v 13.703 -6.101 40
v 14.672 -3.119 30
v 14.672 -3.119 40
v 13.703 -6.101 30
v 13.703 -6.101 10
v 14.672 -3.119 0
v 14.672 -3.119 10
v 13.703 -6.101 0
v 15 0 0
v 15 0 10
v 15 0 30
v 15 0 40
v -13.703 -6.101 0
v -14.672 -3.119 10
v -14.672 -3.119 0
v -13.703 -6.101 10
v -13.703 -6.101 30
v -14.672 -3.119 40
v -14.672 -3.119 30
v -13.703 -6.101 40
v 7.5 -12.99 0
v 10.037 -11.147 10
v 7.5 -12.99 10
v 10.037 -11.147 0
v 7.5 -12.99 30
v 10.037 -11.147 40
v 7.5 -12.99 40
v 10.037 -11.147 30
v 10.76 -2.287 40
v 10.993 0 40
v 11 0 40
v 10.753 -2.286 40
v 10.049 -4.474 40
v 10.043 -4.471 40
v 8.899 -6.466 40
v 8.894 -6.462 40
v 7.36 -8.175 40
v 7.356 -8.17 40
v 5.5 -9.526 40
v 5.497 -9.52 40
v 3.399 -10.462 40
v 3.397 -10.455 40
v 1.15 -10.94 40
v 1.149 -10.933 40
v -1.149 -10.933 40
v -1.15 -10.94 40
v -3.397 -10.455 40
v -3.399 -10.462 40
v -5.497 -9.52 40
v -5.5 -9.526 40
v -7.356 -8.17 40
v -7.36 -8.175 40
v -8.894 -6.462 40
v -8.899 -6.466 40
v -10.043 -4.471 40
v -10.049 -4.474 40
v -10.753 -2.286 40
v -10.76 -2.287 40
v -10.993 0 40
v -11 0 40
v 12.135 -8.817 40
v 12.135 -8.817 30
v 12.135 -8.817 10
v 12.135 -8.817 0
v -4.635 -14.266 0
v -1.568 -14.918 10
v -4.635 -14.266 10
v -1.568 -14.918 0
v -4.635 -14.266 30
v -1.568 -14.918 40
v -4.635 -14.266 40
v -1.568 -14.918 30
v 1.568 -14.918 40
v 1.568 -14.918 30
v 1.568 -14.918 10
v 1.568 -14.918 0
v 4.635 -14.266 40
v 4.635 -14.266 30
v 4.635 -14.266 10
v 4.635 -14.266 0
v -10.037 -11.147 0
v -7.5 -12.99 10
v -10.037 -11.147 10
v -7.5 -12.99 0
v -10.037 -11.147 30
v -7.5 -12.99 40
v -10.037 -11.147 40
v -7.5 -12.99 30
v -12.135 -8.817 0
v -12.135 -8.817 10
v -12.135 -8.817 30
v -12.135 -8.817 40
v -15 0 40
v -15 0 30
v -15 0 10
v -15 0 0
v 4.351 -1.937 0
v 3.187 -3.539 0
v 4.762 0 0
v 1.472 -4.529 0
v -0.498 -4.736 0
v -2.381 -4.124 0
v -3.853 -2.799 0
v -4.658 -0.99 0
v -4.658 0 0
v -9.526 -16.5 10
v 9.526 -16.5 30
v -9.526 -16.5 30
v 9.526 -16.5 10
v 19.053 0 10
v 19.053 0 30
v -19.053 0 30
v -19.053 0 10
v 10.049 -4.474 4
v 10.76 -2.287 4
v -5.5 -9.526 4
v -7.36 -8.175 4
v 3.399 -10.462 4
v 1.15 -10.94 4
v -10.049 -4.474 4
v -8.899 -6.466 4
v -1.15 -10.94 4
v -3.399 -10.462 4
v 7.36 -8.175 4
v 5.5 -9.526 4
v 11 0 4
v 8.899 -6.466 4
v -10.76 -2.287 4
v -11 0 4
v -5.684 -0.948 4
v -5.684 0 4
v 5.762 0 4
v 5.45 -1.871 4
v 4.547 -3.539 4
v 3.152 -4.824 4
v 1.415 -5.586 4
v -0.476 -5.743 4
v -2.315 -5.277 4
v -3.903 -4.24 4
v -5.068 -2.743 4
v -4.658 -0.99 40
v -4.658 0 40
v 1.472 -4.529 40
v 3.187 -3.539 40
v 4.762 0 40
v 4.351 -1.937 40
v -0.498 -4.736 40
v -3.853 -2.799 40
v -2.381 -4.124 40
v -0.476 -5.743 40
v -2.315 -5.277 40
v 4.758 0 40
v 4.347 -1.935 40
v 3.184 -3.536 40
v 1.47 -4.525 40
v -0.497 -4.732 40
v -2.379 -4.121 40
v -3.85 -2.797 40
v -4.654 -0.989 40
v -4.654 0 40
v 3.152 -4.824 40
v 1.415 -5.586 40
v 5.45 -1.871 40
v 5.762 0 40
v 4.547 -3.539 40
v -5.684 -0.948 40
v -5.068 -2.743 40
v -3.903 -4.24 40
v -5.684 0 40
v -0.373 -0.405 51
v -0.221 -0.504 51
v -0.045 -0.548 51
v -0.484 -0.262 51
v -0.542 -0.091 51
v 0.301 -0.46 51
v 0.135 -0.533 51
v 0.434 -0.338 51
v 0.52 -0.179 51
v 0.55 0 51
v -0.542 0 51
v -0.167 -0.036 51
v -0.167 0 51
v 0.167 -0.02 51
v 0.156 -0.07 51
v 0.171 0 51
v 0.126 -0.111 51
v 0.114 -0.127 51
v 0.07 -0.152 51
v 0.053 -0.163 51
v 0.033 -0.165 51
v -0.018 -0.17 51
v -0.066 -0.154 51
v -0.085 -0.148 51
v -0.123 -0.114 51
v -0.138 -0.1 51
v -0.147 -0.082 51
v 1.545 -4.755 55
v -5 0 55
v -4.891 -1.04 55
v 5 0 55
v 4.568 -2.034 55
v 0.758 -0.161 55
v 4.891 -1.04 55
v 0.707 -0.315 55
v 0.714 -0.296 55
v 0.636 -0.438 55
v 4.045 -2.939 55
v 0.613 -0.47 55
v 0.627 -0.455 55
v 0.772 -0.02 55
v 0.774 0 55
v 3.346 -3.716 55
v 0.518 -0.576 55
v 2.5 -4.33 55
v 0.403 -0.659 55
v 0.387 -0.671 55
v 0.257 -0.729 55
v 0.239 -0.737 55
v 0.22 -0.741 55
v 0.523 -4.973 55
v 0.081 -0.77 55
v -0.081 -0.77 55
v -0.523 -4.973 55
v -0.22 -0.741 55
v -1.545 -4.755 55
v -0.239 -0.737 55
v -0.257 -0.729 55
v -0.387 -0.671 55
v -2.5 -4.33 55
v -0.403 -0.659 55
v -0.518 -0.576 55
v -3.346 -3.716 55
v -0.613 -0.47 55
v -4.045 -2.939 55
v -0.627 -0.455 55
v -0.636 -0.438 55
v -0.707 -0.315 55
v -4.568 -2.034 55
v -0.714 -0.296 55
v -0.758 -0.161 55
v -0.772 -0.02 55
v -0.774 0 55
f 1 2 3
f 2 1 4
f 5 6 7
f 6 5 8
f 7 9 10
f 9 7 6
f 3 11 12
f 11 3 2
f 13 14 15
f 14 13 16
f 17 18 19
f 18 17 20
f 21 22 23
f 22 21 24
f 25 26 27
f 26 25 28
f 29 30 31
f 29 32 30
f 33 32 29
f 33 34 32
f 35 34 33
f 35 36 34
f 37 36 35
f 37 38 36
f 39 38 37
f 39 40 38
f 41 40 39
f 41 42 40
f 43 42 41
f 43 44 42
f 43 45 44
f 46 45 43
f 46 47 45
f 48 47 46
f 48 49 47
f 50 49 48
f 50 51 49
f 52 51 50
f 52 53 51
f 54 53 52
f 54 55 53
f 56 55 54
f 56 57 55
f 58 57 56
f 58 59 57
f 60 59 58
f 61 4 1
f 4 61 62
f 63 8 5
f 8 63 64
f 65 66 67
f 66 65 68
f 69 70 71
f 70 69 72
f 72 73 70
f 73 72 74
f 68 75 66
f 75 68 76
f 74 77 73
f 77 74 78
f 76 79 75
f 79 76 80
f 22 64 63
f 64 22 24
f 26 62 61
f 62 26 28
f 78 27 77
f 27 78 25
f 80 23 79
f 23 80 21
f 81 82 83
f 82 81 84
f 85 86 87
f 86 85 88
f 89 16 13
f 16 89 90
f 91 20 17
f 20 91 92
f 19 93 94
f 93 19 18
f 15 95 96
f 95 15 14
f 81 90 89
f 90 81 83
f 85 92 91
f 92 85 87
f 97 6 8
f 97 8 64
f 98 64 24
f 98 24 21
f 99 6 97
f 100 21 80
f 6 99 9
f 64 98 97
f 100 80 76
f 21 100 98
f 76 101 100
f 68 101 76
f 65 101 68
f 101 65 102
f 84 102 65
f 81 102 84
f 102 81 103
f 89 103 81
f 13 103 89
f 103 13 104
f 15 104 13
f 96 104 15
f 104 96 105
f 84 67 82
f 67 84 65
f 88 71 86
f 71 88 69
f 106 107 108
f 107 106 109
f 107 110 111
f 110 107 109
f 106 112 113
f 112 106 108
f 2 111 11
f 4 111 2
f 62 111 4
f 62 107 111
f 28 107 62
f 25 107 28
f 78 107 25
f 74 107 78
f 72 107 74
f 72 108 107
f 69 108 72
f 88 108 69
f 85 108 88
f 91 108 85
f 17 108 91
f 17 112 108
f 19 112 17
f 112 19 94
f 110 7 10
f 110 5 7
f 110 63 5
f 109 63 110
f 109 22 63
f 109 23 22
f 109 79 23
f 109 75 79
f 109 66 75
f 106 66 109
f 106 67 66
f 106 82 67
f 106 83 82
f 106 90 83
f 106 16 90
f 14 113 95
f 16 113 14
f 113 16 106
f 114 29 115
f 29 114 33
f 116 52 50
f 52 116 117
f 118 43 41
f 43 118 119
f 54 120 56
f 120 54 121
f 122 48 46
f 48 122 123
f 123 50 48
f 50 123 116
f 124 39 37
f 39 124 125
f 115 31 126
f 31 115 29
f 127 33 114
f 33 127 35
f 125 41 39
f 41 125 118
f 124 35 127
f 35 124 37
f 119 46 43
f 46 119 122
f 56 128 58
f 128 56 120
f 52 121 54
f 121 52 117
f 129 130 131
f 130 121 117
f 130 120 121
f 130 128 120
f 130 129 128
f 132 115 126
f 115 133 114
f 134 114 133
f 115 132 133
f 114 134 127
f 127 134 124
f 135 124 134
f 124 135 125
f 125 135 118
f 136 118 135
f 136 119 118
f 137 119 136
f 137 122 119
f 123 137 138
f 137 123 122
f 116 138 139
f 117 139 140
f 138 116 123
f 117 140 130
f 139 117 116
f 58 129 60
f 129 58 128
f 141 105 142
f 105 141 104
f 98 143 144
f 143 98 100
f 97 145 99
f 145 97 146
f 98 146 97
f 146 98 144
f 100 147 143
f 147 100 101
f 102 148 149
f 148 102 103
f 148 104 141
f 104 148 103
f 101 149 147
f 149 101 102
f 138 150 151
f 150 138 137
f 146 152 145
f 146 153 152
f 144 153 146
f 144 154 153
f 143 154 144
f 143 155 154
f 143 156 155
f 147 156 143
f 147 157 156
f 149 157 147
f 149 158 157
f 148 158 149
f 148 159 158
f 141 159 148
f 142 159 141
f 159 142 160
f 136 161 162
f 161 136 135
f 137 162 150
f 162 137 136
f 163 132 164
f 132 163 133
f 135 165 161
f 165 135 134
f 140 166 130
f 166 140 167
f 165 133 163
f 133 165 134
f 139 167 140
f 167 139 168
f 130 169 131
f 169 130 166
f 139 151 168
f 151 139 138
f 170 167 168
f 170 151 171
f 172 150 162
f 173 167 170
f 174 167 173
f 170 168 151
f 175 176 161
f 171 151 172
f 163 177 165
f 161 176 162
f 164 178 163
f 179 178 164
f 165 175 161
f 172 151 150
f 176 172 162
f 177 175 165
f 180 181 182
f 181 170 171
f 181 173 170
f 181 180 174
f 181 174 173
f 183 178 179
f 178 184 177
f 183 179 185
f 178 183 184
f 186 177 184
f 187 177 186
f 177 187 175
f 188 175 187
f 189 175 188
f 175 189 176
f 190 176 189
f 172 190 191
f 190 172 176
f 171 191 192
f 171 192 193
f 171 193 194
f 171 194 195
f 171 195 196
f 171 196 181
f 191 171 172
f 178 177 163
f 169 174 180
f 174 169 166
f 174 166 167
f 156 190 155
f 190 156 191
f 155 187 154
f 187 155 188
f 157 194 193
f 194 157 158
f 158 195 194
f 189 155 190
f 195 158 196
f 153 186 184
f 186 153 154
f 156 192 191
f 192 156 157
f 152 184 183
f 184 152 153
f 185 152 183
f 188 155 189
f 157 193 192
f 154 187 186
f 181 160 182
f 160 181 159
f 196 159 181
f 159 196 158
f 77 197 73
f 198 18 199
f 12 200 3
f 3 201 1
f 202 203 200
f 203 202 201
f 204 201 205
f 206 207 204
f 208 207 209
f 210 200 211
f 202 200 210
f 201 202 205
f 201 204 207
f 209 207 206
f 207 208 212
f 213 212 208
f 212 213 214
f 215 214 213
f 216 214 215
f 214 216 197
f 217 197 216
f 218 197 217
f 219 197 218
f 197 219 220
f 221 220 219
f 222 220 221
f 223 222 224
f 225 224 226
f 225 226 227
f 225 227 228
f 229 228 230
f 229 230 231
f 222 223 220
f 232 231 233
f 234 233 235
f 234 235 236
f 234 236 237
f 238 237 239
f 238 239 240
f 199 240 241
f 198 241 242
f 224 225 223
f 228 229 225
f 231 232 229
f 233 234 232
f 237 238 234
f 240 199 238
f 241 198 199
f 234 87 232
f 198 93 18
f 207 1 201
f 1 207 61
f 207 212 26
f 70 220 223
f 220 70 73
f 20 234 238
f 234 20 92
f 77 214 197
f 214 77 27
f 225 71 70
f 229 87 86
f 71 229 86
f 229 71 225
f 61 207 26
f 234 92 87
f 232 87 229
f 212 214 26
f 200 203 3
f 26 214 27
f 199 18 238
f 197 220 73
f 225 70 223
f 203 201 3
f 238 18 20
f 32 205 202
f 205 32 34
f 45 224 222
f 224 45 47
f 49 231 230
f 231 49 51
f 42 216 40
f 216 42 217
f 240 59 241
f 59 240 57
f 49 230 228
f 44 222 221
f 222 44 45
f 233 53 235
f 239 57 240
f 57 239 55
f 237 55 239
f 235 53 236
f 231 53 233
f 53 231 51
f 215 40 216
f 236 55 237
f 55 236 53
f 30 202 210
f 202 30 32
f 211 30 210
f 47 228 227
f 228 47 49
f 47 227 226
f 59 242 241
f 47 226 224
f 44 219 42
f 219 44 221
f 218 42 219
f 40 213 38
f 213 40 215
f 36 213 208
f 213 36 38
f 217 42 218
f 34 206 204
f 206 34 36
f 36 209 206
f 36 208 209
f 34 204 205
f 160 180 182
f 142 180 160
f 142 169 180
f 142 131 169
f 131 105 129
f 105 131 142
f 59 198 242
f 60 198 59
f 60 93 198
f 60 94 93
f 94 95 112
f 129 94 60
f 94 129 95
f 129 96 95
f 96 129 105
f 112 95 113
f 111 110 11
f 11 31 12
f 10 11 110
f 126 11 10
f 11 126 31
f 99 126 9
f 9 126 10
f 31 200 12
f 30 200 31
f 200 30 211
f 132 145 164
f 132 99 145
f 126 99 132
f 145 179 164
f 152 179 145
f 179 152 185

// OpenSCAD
// file: lib/polygon.scad
//============================================================
// OpenSCAD
// Regular Convex Polygon Library
//============================================================
/*

	Definition

	N = Number of Side N >=3
	A = apothem
		radius of inside circle
	R = circumradius
		Radius of outside circle
	S = Side
		Lenght of a side

	Build polygon with the Apothem :
	N and A is known
	Need to calculate S then R
	use $fn

	Build Polygon with Circumradius
	N and R known
	use $fn

	Build Polygon with Side
	N and S Known
	Need to calculate R and optionaly A
	use $fn	

	TO DO
	ASSIGN Correction - not mandatory


	For more information :
	http://en.wikipedia.org/wiki/Regular_polygon

*/

//------------------------------------------------------------
// Polygon : 
//------------------------------------------------------------
module Polygon(N=3,A=0,R=0,S=0,h=0,debug=false)
{
	N = ( N < 3 ? 3 : N );

	angle = 360/N;
	angleA = angle/2;

	if (debug)
	{
		echo("N = ", N);
		echo("A = ", A);
		echo("S = ", S);
		echo("R = ", R);
	}

	if ( A > 0 )		// if A assign R and S
	{
			assign
			(
				S = 2 * A * tan(angleA),							// assign
				//R = (S/2) / sin(angleA)						// no assign ???
				R = ( A * tan(angleA) ) / sin(angleA)		// asign
			)
			{
				_Build_Polygon(N=N,R=R,h=h);
				if (debug)
				{
					echo("aN = ", N);
					echo("aA = ", A);
					echo("aS = ", S);
					echo("aR = ", R);
					#cylinder(r=A,h=h+1,center=true,$fn=150);
					%cylinder(r=R,h=h+1,center=true,$fn=150);
				}
			}
	}
	else
	{
		if ( S > 0 )		// if S assign R and A
		{
			assign
			(
				R = (S/2) / sin(angleA),			// assign
				A = S / ( 2 * tan(angleA) )		// assign
			)
			{
				_Build_Polygon(N=N,R=R,h=h);
				if (debug)
				{
					echo("sN = ", N);
					echo("sA = ", A);
					echo("sS = ", S);
					echo("sR = ", R);
					#cylinder(r=A,h=h+1,center=true,$fn=150);
					%cylinder(r=R,h=h+1,center=true,$fn=150);
				}
			}
		}
		else
		{
			if ( R == 0 )		// default
			{
				assign
				(
					S = 2 * R * sin(angleA),			// no assign ???
					A = S / ( 2 * tan(angleA) )		// no assign ???
				)
				_Build_Polygon(N=N,h=h);
				if (debug)
				{
					echo("0N = ", N);
					echo("0A = ", A);
					echo("0S = ", S);
					echo("0R = ", R);
					#cylinder(r=A,h=h+1,center=true,$fn=150);
					%cylinder(r=R,h=h+1,center=true,$fn=150);
				}
			}
			else		// build with R
			{

// assign ???
				assign
				(
					S = 2 * R * sin(angleA),
					A = S / ( 2 * tan(angleA) )						// no assign ???
					//A = R * ( sin(angleA) / tan(angleA) )	// no assign ???
				)
				_Build_Polygon(N=N,R=R,h=h);
				if (debug)
				{
					echo("rN = ", N);
					echo("rA = ", A);
					echo("rS = ", S);
					echo("rR = ", R);
					%cylinder(r=R,h=h+1,center=true,$fn=150);
				}




			}
		}
	}

	if (debug)
	{
		echo("fN = ", N);
		echo("fA = ", A);
		echo("fS = ", S);
		echo("fR = ", R);
	}
}

//------------------------------------------------------------
// Build
//------------------------------------------------------------
module _Build_Polygon(N=3,R=1,h=0)
{
	if (h > 0)
	{
		// 3D primitive h>0
		cylinder(r=R,h=h,$fn=N,center=true);
	}
	else
	{
		// 2D primitive h=0
		circle(r=R,$fn=N,center=true);
	}
}

//------------------------------------------------------------
// Building lots from N=3, N=N+1
// http://en.wikipedia.org/wiki/Polygon
//------------------------------------------------------------

module Trigon(A=0,R=0,S=0,h=0,debug=false)
	{Polygon(N=3,A=A,R=R,S=S,h=h,debug=debug);}

module Triangle(A=0,R=0,S=0,h=0,debug=false)
	{Polygon(N=3,A=A,R=R,S=S,h=h,debug=debug);}

module Tetragon(A=0,R=0,S=0,h=0,debug=false)
	{Polygon(N=4,A=A,R=R,S=S,h=h,debug=debug);}

module Quadrilateral(A=0,R=0,S=0,h=0,debug=false)
	{Polygon(N=4,A=A,R=R,S=S,h=h,debug=debug);}

module Quadrangle(A=0,R=0,S=0,h=0,debug=false)
	{Polygon(N=4,A=A,R=R,S=S,h=h,debug=debug);}

module Pentagon(A=0,R=0,S=0,h=0,debug=false)
	{Polygon(N=5,A=A,R=R,S=S,h=h,debug=debug);}

module Hexagon(A=0,R=0,S=0,h=0,debug=false)
	{Polygon(N=6,A=A,R=R,S=S,h=h,debug=debug);}

module Heptagon(A=0,R=0,S=0,h=0,debug=false)
	{Polygon(N=7,A=A,R=R,S=S,h=h,debug=debug);}

module Octagon(A=0,R=0,S=0,h=0,debug=false)
	{Polygon(N=8,A=A,R=R,S=S,h=h,debug=debug);}

module Enneagon(A=0,R=0,S=0,h=0,debug=false)
	{Polygon(N=9,A=A,R=R,S=S,h=h,debug=debug);}

module Nonagon(A=0,R=0,S=0,h=0,debug=false)
	{Polygon(N=9,A=A,R=R,S=S,h=h,debug=debug);}

module Decagon(A=0,R=0,S=0,h=0,debug=false)
	{Polygon(N=10,A=A,R=R,S=S,h=h,debug=debug);}

module Handecagon(A=0,R=0,S=0,h=0,debug=false)
	{Polygon(N=11,A=A,R=R,S=S,h=h,debug=debug);}

module Dodecagon(A=0,R=0,S=0,h=0,debug=false)
	{Polygon(N=12,A=A,R=R,S=S,h=h,debug=debug);}

// ...

module Hectogon(A=0,R=0,S=0,h=0,debug=false)
	{Polygon(N=100,A=A,R=R,S=S,h=h,debug=debug);}

//==EOF=======================================================
// file: constants.scad
intake_material_thickness=2;
intake_port1_diameter=120;
intake_port1_length=100;

intake_port2_diameter=80;
intake_port2_length=100;

fan_diameter_inner = 125;
fan_diameter_outer = 250;
fan_base_thickness = 15;
fan_blades = 36;
fan_blade_thickness = 4;
fan_height = 50;

intake_box_size = 300;




plenum_show_section=1;
plenum_diameter=400;
plenum_height=1000;
plenum_taper=600;
plenum_taper_to=100;

plenum_wall_thickness = 2;

plenum_port1_diameter = 80;
plenum_port1_length = 100;

plenum_port2_diameter = plenum_diameter / 3;
plenum_port2_inner_length = 300;
plenum_port2_outer_length = 300;

plenum_entry_height = plenum_height - 200;
plenum_entry_width = plenum_port1_diameter + 10;
// main file
include <constants.scad>
include <lib/polygon.scad>

section=1;

nozzle_nut_size=20;
nozzle_nut_height=10;
//Hexagon(nozzle_nut_size,h=nozzle_nut_height);

nozzle_dia = 30;
nozzle_height = 40;
nozzle_port_dia = 4;

nozzle_water_port_dia = 3/8 * 25.4;
nozzle_water_pinhole_dia=0.1;
nozzle_air_pinhole_dia=0.2;

nozzle_wall_thickness = 4;
nozzle_inner_wall_thickness = 2;

nozzle_tip_height = 15;

module nozzle() {
	
	module nozzle_outer_body() {
		cylinder(
			h=nozzle_height,
			d=nozzle_dia
		);
		translate([
			0,0,nozzle_height/2
		]) Hexagon(nozzle_dia*0.55, h=nozzle_height/2);
	}

	module nozzle_body_hole(){
		translate([0,0,nozzle_wall_thickness]) cylinder(
			h=nozzle_height+1,
			d=nozzle_dia-nozzle_wall_thickness*2
		);
		translate([0,0,-1])
			cylinder(
				h=nozzle_wall_thickness+2,
				d=nozzle_water_port_dia
			);
	}

	module nozzle_water_body() {
		difference() {
		union() {
			cylinder(
				h=nozzle_height,
				d=nozzle_water_port_dia + nozzle_inner_wall_thickness
			);
		}
		translate([0,0,-1])
			cylinder(
				h=nozzle_height+2,
				d=nozzle_water_port_dia
			);
		}
	}

	module nozzle_water_cap() {
		translate([0,0,nozzle_height])
		difference() {
			cylinder(
				h=nozzle_tip_height-4,
				d1=nozzle_water_port_dia + nozzle_inner_wall_thickness,
				d2=nozzle_water_pinhole_dia+1
			);
			translate([0,0,-0.01])
			cylinder(
				h=nozzle_tip_height-3.7,
				d1=nozzle_water_port_dia,
				d2=nozzle_water_pinhole_dia
			);
		}
	}

	module nozzle_air_cap() {
		translate([0,0,nozzle_height])		
		difference() {
			cylinder(
				h=nozzle_tip_height,
				d1=nozzle_dia,
				d2=10
			);
			translate([0,0,-0.01])
			cylinder(
				h=nozzle_tip_height+1,
				d1=nozzle_dia-nozzle_wall_thickness*2,
				d2=nozzle_air_pinhole_dia
			);

		}
	}

	module nozzle_body() {
		difference() {
			nozzle_outer_body();
			nozzle_body_hole();
		}
		nozzle_water_body();
		nozzle_water_cap();

		nozzle_air_cap();
	}

	nozzle_body();
}

difference() {
	nozzle();
	if(section)translate([-100, 0,-1]) cube(200);
}
